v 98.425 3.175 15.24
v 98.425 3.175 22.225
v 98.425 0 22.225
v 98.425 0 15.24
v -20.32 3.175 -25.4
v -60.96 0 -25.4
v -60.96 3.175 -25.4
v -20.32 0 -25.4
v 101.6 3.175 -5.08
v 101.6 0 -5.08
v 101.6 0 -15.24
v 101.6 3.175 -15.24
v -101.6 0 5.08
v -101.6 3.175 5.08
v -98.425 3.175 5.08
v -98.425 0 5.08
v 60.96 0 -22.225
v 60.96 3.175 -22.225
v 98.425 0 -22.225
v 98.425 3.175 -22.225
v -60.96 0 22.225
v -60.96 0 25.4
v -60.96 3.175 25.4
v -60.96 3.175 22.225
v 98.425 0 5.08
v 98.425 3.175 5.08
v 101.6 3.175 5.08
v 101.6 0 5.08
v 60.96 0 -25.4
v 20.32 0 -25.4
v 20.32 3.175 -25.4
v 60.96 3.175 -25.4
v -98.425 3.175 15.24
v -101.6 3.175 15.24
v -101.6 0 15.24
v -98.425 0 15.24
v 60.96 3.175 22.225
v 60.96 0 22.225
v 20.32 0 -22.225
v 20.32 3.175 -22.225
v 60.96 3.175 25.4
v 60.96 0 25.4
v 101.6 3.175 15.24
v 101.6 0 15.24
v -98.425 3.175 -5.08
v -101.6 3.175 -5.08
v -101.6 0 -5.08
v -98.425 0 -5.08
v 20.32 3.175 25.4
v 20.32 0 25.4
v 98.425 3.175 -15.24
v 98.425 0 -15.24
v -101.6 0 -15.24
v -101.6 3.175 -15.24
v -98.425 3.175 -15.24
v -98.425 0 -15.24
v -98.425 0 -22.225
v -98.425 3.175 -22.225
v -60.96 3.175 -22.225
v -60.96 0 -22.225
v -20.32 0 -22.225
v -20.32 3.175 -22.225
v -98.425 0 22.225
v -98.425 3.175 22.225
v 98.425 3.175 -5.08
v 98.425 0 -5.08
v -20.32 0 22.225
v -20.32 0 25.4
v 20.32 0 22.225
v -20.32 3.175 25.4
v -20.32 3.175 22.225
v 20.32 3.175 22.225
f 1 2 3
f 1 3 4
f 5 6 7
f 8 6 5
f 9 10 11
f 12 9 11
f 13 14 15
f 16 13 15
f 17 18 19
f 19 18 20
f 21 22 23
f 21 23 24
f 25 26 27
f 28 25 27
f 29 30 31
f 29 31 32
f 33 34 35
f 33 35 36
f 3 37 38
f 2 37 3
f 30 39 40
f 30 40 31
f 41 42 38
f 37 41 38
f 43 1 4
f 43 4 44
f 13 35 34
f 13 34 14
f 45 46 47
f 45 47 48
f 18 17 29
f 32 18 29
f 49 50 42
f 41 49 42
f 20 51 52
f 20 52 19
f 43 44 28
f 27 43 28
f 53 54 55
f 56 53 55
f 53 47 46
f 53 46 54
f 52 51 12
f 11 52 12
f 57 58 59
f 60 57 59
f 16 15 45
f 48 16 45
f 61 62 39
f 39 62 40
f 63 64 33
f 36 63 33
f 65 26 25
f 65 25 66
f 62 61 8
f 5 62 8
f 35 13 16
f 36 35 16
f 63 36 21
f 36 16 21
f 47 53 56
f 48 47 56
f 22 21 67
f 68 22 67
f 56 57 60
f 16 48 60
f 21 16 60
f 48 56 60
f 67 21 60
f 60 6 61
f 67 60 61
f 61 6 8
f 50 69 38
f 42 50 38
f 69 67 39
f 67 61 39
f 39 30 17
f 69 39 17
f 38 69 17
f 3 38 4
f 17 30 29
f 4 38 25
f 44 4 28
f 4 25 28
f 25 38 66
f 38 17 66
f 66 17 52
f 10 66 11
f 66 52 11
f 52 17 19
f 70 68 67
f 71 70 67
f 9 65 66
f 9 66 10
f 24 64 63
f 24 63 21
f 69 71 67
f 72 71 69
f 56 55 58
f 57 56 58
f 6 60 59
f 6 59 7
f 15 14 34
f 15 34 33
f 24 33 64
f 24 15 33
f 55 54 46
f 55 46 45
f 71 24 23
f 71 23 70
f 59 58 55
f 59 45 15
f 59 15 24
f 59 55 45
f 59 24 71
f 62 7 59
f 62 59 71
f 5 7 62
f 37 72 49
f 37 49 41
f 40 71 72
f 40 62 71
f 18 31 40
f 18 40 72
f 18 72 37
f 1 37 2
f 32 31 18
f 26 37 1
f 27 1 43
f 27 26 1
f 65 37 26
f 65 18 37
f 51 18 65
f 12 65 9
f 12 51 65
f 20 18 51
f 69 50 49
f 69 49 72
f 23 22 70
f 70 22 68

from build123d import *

# Parameters (mm, degrees)
SKETCH1_W           = 203.2
SKETCH1_H           = 50.8
BOSS_EXTRUDE1_DEPTH = 3.175
SKETCH2_W           = 40.64
SKETCH2_H           = 3.175
CUT_EXTRUDE2_DEPTH  = 3.175
LPATTERN1_COUNT     = 3
LPATTERN1_PITCH     = 81.28
SKETCH3_W           = 3.175
SKETCH3_H           = 10.16
CUT_EXTRUDE3_DEPTH  = 3.175
LPATTERN2_COUNT     = 2
LPATTERN2_PITCH     = 20.32
LPATTERN3_COUNT     = 2
LPATTERN3_PITCH     = 20.32


with BuildPart() as part:
    # Sketch1 → Boss-Extrude1 (new body)
    with BuildSketch(Plane(origin=(0, 0, 0), x_dir=(1, 0, 0), z_dir=(0, 1, 0))):
        Rectangle(SKETCH1_W, SKETCH1_H)
    extrude(amount=BOSS_EXTRUDE1_DEPTH)

    # Sketch2 → Cut-Extrude2 (cut)
    with BuildSketch(Plane(origin=(0, 3.175, 0), x_dir=(1, 0, 0), z_dir=(0, 1, 0))):
        with Locations((-81.28, 23.8125)):
            Rectangle(SKETCH2_W, SKETCH2_H)
        with Locations((-81.28, -23.8125)):
            Rectangle(SKETCH2_W, SKETCH2_H)
    cut_extrude2 = extrude(amount=-CUT_EXTRUDE2_DEPTH, mode=Mode.SUBTRACT)

    # LPattern1: Cut-Extrude2 ×3
    with Locations(*[(i * LPATTERN1_PITCH, 0, 0) for i in range(1, LPATTERN1_COUNT)]):
        add(cut_extrude2, mode=Mode.SUBTRACT)

    # Sketch3 → Cut-Extrude3 (cut)
    with BuildSketch(Plane(origin=(0, 3.175, 0), x_dir=(1, 0, 0), z_dir=(0, 1, 0))):
        with Locations((-100.0125, 0)):
            Rectangle(SKETCH3_W, SKETCH3_H)
        with Locations((100.0125, 0)):
            Rectangle(SKETCH3_W, SKETCH3_H)
    cut_extrude3 = extrude(amount=-CUT_EXTRUDE3_DEPTH, mode=Mode.SUBTRACT)

    # LPattern2: Cut-Extrude3 ×2
    with Locations(*[(0, 0, i * LPATTERN2_PITCH) for i in range(1, LPATTERN2_COUNT)]):
        add(cut_extrude3, mode=Mode.SUBTRACT)

    # LPattern3: Cut-Extrude3 ×2
    with Locations(*[(0, 0, -i * LPATTERN3_PITCH) for i in range(1, LPATTERN3_COUNT)]):
        add(cut_extrude3, mode=Mode.SUBTRACT)


solid = part.part
